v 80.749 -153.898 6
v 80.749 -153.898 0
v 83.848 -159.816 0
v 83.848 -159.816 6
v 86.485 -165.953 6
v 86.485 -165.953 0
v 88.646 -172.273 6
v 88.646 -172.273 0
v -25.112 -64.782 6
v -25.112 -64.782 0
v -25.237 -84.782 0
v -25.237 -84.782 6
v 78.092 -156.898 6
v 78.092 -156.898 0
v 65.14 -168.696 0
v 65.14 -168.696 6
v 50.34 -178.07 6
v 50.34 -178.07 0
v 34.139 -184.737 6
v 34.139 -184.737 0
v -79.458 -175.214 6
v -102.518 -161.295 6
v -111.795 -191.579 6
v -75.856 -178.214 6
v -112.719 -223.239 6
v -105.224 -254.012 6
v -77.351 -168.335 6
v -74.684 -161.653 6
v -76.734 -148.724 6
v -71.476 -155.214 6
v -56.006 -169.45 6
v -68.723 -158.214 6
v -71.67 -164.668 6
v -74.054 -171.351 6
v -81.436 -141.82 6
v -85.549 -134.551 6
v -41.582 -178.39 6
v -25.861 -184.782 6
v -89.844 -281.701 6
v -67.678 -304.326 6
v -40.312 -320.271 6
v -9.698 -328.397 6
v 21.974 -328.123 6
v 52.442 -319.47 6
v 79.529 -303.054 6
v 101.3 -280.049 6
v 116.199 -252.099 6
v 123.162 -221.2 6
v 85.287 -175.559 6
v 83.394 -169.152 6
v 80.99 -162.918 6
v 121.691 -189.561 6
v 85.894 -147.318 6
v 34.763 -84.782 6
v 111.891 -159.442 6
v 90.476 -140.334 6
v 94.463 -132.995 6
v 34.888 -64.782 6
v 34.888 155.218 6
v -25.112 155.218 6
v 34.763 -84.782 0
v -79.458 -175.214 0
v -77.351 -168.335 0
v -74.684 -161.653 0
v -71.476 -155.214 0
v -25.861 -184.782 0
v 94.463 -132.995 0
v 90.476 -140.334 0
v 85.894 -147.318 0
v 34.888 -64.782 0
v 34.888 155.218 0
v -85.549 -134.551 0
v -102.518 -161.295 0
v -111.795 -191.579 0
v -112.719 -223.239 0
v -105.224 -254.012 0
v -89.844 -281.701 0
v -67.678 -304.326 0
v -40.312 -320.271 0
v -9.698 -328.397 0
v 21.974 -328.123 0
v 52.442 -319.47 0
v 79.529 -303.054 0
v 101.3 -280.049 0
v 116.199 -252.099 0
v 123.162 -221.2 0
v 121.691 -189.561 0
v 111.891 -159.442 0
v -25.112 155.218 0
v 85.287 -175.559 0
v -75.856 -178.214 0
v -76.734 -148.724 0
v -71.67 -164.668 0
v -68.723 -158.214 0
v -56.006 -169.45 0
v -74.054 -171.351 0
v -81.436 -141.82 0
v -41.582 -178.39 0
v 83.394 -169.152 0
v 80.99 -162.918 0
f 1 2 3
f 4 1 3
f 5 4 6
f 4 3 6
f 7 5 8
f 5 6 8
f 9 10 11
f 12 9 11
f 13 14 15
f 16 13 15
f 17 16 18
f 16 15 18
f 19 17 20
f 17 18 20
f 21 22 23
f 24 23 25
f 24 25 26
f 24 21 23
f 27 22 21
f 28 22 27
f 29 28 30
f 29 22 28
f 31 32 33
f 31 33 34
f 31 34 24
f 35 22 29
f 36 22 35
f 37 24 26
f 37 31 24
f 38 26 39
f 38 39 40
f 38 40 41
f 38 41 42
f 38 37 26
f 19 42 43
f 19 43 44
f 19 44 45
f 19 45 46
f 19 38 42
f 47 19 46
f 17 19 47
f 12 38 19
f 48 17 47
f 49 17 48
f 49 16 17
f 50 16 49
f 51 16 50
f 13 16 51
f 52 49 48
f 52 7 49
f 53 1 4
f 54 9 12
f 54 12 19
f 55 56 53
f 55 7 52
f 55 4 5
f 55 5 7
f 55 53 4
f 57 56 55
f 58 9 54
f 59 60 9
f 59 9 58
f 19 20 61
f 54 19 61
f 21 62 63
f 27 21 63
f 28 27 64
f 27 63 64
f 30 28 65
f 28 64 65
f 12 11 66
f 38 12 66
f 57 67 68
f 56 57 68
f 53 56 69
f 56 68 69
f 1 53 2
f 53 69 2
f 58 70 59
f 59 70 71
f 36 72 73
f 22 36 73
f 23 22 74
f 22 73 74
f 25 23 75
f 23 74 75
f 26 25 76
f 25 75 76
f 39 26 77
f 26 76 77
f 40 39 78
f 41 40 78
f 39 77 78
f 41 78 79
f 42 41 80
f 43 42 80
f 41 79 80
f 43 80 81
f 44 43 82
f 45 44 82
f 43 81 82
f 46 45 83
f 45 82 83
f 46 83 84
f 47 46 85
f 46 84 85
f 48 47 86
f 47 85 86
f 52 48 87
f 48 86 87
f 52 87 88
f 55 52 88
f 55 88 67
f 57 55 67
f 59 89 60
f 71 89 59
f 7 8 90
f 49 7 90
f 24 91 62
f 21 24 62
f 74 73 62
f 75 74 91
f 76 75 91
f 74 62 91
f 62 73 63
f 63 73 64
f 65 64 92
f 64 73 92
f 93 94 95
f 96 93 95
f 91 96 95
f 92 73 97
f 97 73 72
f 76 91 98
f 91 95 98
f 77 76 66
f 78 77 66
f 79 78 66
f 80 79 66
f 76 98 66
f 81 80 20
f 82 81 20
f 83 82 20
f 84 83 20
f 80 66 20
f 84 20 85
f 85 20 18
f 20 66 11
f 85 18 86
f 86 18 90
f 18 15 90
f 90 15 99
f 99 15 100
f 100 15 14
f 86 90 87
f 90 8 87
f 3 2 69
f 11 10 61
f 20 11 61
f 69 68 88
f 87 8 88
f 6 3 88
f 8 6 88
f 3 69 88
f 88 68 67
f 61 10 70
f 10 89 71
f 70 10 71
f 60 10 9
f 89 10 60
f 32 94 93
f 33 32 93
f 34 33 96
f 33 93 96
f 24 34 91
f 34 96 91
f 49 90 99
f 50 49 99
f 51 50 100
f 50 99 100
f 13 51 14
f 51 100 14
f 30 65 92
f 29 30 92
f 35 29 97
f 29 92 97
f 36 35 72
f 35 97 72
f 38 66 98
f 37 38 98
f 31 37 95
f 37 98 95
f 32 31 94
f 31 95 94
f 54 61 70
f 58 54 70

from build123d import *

# Parameters (mm, degrees)
F0_W     = 60
F0_H     = 220
F1_DEPTH = 6


# Not quite as in the source:
# - the program builds the solid bodies; features that only make, move or delete a surface that nothing else refers to are left out


with BuildPart() as f1:
    # F0 (on Top) → F1 (new body)
    with BuildSketch(Plane.XY):
        with Locations((4.8876879096, 45.2179194741)):
            Rectangle(F0_W, F0_H)
        with BuildLine():
            ThreePointArc((-79.4584430704, -175.2136584167), (-76.086405566, -164.9666401832), (-71.4764851469, -155.2136584167))
            ThreePointArc((-71.4764851469, -155.2136584167), (-79.1565485083, -145.3205641479), (-85.5490516624, -134.5505784994))
            ThreePointArc((-85.5490516624, -134.5505784994), (6.1468085688, -329.3233337338), (94.4628409087, -132.9949471034))
            ThreePointArc((94.4628409087, -132.9949471034), (88.2574232589, -143.8738017875), (80.7494829473, -153.8981481364))
            ThreePointArc((80.7494829473, -153.8981481364), (85.2254366965, -162.8589485125), (88.6456429035, -172.2734211397))
            ThreePointArc((88.6456429035, -172.2734211397), (75.2367314586, -249.2062042963), (5.6459887203, -284.6403764396))
            ThreePointArc((5.6459887203, -284.6403764396), (-63.9155377146, -250.9329661403), (-79.4584430704, -175.2136584167))
        make_face()
        with BuildLine():
            ThreePointArc((4.8876879096, -189.3289751767), (-10.6634233248, -188.2490297182), (-25.8614792361, -184.7816907769))
            ThreePointArc((-25.8614792361, -184.7816907769), (-48.9823809676, -174.2243385437), (-68.7229965841, -158.2136584167))
            ThreePointArc((-68.7229965841, -158.2136584167), (-72.9335538665, -167.9839691049), (-75.8560904631, -178.2136584167))
            ThreePointArc((-75.8560904631, -178.2136584167), (-59.2361153237, -247.9542245013), (5.5975931326, -278.5574984969))
            Line((5.5975931326, -278.5574984969), (4.8876879096, -189.3289751767))
        make_face()
        with BuildLine():
            ThreePointArc((78.0917461365, -156.8981481364), (57.9442467877, -173.7054474984), (34.1385207639, -184.7369682609))
            ThreePointArc((34.1385207639, -184.7369682609), (19.6828166371, -188.1140297879), (4.8876879096, -189.3289751767))
            Line((4.8876879096, -189.3289751767), (5.5975931326, -278.5574984969))
            ThreePointArc((5.5975931326, -278.5574984969), (70.4913174106, -246.4384867175), (85.2871903638, -175.5589515052))
            ThreePointArc((85.2871903638, -175.5589515052), (82.255170922, -166.010419768), (78.0917461365, -156.8981481364))
        make_face()
        with BuildLine():
            ThreePointArc((5.5975931326, -278.5574984969), (-59.2361153237, -247.9542245013), (-75.8560904631, -178.2136584167))
            Line((-75.8560904631, -178.2136584167), (-79.4584430704, -175.2136584167))
            ThreePointArc((-79.4584430704, -175.2136584167), (-63.9155377146, -250.9329661403), (5.6459887203, -284.6403764396))
            Line((5.6459887203, -284.6403764396), (5.5975931326, -278.5574984969))
        make_face()
        with BuildLine():
            ThreePointArc((85.2871903638, -175.5589515052), (70.4913174106, -246.4384867175), (5.5975931326, -278.5574984969))
            Line((5.5975931326, -278.5574984969), (5.6459887203, -284.6403764396))
            ThreePointArc((5.6459887203, -284.6403764396), (75.2367314586, -249.2062042963), (88.6456429035, -172.2734211397))
            Line((88.6456429035, -172.2734211397), (85.2871903638, -175.5589515052))
        make_face()
        with BuildLine():
            Line((34.7627821954, -84.7816907769), (-25.2371712536, -84.7816907769))
            Line((-25.2371712536, -84.7816907769), (-25.8614792361, -184.7816907769))
            ThreePointArc((-25.8614792361, -184.7816907769), (-10.6634233248, -188.2490297182), (4.8876879096, -189.3289751767))
            ThreePointArc((4.8876879096, -189.3289751767), (19.6828166371, -188.1140297879), (34.1385207639, -184.7369682609))
            Line((34.1385207639, -184.7369682609), (34.7627821954, -84.7816907769))
        make_face()
        Polygon((34.8876879096, -64.7820805259), (-25.1123120904, -64.7820805259), (-25.2371712536, -84.7816907769), (34.7627821954, -84.7816907769), align=None)
    extrude(amount=F1_DEPTH)


solid = f1.part
